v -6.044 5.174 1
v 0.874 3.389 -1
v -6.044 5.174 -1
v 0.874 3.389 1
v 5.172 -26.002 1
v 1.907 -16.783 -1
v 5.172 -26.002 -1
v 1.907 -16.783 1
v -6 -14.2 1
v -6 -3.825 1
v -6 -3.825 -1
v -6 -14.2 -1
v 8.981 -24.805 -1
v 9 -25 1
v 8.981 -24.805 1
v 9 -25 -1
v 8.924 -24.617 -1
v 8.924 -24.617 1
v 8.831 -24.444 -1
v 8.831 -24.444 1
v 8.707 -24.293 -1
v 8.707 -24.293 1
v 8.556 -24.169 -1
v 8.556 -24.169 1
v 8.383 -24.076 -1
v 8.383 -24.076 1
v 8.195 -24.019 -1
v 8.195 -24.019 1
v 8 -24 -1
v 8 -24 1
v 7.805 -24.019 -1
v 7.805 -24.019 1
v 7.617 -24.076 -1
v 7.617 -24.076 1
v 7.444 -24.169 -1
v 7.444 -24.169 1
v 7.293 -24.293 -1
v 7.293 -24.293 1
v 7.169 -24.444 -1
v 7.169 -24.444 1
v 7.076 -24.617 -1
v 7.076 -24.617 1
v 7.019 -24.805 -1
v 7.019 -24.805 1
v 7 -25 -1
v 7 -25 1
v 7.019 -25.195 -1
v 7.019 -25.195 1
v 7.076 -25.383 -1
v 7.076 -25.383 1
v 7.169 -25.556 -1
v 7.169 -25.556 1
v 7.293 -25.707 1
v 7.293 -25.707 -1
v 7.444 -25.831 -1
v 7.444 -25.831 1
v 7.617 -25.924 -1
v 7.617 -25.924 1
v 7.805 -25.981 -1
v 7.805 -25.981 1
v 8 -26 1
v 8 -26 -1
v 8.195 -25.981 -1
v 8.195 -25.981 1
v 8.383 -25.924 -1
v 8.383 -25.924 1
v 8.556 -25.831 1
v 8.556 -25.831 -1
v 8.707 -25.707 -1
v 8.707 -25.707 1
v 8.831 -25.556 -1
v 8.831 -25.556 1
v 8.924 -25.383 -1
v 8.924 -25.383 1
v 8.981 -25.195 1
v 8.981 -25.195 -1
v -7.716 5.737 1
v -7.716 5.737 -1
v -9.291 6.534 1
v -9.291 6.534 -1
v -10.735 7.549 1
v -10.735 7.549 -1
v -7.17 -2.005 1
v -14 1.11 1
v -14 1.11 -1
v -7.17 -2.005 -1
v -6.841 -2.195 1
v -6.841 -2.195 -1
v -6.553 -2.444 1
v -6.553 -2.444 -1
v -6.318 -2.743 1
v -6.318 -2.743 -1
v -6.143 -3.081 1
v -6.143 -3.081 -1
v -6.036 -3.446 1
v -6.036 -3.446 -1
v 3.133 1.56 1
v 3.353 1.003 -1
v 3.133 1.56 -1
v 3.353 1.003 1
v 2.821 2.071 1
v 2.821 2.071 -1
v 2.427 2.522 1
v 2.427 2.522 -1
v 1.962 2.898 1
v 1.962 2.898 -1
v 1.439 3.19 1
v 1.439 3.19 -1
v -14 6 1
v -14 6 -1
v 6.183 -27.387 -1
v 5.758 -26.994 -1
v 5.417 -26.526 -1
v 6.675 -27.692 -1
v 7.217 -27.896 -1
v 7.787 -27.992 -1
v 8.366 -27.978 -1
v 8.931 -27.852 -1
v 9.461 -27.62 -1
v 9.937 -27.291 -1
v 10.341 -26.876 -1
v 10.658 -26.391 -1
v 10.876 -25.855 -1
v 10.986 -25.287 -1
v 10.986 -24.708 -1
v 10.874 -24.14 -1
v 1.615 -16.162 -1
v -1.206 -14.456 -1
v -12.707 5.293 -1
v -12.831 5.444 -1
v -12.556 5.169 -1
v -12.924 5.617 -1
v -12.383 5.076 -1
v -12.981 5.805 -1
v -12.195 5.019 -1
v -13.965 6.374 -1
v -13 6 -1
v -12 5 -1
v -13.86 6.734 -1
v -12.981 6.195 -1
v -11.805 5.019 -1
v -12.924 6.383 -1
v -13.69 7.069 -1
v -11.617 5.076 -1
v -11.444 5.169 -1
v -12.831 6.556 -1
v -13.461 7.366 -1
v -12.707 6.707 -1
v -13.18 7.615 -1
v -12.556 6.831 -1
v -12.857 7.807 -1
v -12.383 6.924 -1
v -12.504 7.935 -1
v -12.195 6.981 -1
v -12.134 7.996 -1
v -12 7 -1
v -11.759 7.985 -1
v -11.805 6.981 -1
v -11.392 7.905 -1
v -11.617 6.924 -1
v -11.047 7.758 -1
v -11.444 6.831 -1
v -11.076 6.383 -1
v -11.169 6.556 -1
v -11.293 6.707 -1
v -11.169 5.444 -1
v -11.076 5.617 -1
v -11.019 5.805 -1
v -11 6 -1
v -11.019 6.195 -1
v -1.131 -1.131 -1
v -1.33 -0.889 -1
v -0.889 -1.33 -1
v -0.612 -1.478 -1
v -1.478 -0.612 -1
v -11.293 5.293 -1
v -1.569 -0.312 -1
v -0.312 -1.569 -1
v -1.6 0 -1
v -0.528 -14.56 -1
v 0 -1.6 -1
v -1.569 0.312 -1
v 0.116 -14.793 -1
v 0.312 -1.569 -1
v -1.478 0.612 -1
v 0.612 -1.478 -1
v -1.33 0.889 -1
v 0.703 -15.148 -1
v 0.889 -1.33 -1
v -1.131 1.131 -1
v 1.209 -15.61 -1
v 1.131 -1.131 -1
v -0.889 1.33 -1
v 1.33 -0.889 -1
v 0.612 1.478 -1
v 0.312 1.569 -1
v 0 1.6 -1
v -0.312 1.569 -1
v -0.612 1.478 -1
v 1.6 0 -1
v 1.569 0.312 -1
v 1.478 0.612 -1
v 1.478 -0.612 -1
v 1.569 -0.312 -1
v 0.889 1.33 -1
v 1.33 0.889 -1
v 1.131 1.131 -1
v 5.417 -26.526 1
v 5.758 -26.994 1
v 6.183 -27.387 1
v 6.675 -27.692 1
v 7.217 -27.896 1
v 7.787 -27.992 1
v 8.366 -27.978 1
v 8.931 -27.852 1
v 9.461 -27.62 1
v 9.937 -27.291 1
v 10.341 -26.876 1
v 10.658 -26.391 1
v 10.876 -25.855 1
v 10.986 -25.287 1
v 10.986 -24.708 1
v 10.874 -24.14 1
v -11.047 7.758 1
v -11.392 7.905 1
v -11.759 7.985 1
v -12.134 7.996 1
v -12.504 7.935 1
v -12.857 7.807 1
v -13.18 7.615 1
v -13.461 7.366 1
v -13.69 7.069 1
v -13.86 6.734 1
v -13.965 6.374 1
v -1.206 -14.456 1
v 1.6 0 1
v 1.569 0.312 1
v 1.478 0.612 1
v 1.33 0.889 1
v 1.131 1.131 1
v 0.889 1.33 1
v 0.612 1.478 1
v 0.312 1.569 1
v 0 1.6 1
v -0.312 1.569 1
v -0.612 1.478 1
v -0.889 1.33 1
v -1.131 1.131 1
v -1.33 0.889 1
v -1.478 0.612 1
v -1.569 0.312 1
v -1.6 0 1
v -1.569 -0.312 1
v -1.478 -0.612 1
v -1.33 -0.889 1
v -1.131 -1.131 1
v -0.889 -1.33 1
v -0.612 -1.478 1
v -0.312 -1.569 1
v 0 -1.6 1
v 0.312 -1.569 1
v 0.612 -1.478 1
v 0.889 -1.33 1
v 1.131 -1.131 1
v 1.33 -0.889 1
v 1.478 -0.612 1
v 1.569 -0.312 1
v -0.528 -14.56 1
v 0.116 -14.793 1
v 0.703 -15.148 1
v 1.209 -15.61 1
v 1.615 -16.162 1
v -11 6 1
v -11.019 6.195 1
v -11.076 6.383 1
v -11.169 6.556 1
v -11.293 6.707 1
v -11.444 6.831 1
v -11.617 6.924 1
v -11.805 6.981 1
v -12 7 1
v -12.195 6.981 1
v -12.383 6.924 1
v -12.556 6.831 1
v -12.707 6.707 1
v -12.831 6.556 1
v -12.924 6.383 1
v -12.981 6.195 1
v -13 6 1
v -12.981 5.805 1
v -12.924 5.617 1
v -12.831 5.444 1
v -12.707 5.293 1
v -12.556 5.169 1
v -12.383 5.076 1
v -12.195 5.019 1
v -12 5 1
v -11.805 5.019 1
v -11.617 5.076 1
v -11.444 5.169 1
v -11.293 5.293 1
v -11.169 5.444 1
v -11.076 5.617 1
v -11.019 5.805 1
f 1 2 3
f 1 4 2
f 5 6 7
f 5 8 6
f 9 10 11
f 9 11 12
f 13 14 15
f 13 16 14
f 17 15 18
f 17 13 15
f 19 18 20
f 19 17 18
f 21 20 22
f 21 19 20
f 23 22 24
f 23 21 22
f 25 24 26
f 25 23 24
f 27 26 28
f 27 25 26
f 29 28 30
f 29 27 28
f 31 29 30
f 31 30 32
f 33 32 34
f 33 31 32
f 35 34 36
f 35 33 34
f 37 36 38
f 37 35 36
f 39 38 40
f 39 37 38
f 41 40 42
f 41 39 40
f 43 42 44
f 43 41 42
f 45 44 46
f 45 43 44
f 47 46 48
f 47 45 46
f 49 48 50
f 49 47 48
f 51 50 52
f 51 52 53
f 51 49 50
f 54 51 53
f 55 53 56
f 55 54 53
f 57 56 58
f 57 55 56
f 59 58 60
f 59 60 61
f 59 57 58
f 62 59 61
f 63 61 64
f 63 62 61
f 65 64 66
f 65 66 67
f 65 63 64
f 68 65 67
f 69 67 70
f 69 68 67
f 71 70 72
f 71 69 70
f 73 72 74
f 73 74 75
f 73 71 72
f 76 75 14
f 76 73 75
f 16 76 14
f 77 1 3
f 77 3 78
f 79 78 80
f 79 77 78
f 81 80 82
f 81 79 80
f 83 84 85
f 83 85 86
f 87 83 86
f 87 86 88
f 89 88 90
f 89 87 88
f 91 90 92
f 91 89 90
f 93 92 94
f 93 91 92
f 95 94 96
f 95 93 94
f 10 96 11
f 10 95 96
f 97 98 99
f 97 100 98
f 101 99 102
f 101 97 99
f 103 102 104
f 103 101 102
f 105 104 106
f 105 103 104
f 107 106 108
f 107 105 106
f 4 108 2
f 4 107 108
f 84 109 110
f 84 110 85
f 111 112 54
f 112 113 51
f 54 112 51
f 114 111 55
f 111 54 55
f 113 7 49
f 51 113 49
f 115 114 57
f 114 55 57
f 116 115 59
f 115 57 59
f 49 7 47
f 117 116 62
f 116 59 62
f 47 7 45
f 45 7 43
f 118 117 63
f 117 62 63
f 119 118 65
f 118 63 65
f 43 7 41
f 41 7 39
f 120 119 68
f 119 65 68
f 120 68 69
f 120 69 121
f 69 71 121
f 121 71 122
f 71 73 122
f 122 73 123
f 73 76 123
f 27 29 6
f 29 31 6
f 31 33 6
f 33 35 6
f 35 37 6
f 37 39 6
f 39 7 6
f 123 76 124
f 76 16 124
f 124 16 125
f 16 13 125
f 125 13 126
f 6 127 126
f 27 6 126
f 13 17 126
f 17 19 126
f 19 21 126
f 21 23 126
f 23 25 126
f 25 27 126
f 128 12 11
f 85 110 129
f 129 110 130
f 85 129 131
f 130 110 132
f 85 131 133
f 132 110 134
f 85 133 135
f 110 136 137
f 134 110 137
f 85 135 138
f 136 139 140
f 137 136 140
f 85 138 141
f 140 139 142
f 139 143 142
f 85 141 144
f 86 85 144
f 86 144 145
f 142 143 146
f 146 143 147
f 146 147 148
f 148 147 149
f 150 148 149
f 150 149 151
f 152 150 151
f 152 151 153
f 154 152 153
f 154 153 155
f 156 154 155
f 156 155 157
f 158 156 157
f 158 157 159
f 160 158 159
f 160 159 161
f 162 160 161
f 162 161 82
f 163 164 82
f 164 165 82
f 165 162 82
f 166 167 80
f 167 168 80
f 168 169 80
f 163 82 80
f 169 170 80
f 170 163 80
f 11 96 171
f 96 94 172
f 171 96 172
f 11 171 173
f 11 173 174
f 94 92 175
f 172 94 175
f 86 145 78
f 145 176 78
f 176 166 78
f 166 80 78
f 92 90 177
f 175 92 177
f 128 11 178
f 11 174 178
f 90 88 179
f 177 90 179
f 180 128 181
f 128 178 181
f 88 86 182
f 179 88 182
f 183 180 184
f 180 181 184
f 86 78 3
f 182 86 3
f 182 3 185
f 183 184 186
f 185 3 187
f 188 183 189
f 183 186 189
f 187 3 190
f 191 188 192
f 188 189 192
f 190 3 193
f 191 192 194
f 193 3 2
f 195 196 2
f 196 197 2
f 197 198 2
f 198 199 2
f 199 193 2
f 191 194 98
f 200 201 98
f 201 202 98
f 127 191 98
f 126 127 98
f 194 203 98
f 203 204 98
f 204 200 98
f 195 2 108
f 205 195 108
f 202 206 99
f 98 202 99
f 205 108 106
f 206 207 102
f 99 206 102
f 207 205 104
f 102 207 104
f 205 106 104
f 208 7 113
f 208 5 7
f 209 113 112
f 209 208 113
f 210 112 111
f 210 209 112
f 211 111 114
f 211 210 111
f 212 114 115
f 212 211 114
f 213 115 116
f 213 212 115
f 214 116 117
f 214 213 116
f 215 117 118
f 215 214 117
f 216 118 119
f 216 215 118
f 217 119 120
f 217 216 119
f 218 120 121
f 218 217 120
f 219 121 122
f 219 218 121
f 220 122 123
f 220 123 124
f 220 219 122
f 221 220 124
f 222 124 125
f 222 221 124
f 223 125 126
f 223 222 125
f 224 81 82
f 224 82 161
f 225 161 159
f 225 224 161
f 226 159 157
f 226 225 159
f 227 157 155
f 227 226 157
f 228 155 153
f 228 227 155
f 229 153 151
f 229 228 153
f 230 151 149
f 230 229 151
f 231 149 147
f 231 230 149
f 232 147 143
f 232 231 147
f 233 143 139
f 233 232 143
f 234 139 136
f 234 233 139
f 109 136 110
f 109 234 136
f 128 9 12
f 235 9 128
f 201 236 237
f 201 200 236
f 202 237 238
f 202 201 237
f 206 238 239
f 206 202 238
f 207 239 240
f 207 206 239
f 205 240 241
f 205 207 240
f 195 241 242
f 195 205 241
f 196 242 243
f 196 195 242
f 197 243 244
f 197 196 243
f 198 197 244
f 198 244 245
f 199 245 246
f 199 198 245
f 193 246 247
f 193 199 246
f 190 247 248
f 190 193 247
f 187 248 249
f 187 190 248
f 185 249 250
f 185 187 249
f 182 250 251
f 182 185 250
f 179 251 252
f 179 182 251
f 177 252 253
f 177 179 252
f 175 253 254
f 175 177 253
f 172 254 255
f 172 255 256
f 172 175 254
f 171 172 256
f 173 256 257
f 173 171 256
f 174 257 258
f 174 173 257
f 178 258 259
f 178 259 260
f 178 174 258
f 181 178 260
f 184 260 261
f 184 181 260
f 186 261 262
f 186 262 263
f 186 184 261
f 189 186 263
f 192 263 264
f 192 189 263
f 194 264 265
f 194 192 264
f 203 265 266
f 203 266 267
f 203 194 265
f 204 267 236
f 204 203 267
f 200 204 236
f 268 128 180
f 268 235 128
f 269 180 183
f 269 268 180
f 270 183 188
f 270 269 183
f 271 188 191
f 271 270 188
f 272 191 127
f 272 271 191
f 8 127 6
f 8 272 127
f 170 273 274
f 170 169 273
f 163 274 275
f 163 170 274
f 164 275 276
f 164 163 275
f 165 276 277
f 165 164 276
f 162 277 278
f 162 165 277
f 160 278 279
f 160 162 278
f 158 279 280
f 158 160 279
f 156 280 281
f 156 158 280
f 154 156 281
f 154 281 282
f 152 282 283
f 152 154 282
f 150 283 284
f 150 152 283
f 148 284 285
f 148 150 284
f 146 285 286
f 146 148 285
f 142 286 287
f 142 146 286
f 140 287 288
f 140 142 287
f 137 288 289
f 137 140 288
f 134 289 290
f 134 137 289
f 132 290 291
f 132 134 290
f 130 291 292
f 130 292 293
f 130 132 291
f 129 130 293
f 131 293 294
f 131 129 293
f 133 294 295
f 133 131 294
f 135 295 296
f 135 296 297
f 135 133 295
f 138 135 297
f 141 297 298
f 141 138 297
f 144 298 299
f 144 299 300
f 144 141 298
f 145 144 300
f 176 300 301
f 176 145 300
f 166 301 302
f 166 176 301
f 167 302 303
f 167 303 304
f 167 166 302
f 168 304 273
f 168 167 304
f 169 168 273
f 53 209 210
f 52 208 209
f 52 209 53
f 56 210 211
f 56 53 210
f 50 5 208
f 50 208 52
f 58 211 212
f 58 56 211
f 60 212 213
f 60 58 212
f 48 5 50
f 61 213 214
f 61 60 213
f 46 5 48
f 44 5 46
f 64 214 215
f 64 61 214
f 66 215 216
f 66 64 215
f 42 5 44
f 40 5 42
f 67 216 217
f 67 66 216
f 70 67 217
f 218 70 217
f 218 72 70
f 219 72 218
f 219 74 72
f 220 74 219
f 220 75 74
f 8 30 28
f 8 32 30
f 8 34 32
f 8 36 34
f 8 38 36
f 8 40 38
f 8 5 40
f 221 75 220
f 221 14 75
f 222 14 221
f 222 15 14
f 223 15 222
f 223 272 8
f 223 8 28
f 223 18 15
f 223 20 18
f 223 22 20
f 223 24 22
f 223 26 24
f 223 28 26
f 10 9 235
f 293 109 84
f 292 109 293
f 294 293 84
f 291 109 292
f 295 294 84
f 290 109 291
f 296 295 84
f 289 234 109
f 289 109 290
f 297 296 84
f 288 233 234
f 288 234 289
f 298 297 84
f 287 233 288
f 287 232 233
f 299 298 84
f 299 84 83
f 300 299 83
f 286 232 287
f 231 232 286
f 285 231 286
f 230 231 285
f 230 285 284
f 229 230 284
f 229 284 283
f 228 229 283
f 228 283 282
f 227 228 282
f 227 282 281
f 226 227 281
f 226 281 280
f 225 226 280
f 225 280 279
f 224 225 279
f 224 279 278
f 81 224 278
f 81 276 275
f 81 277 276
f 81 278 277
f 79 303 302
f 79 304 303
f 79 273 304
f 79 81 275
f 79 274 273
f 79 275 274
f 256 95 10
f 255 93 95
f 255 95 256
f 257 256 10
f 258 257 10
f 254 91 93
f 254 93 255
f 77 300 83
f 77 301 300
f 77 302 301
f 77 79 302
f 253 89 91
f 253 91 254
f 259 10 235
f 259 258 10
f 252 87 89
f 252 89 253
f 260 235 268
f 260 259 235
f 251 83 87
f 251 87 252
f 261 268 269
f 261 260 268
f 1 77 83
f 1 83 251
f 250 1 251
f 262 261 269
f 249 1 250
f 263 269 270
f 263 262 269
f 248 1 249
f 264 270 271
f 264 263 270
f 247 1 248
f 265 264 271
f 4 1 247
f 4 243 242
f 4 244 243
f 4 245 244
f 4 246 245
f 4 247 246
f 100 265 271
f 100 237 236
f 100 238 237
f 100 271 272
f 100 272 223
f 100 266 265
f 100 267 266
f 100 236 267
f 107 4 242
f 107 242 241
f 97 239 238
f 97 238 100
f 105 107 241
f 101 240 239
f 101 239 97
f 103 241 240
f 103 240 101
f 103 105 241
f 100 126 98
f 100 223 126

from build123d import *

# Parameters (mm, degrees)
SKETCH_1_R      = 1
SKETCH_1_R_2    = 1.6
EXTRUDE_1_DEPTH = 1


with BuildPart() as part:
    # 草图1 → 凸台-拉伸1 (new body, symmetric)
    with BuildSketch(Plane.XY):
        with BuildLine():
            Line((0.874328329, 3.389033782), (-6.043528055, 5.173754207))
            ThreePointArc((-6.043528055, 5.173754207), (-8.518069078, 6.106819418), (-10.734845082, 7.548994201))
            ThreePointArc((-10.734845082, 7.548994201), (-12.857231055, 7.806973967), (-14, 6))
            Line((-14, 6), (-14, 1.110000054))
            Line((-14, 1.110000054), (-7.170013537, -2.005324011))
            ThreePointArc((-7.170013537, -2.005324011), (-6.317743639, -2.743301367), (-6, -3.824973007))
            Line((-6, -3.824973007), (-6, -14.200378782))
            Line((-6, -14.200378782), (-1.20605244, -14.456265808))
            ThreePointArc((-1.20605244, -14.456265808), (0.702747897, -15.147812467), (1.906524604, -16.782644918))
            Line((1.906524604, -16.782644918), (5.172173145, -26.001696201))
            ThreePointArc((5.172173145, -26.001696201), (8.931003799, -27.851882173), (10.874170567, -24.140265418))
            Line((10.874170567, -24.140265418), (3.353198995, 1.003023678))
            ThreePointArc((3.353198995, 1.003023678), (2.427191355, 2.521654641), (0.874328329, 3.389033782))
        make_face()
        with Locations((-12, 6)):
            Circle(SKETCH_1_R, mode=Mode.SUBTRACT)
        with Locations((8, -25)):
            Circle(SKETCH_1_R, mode=Mode.SUBTRACT)
        Circle(SKETCH_1_R_2, mode=Mode.SUBTRACT)
    extrude(amount=EXTRUDE_1_DEPTH, both=True)


solid = part.part
